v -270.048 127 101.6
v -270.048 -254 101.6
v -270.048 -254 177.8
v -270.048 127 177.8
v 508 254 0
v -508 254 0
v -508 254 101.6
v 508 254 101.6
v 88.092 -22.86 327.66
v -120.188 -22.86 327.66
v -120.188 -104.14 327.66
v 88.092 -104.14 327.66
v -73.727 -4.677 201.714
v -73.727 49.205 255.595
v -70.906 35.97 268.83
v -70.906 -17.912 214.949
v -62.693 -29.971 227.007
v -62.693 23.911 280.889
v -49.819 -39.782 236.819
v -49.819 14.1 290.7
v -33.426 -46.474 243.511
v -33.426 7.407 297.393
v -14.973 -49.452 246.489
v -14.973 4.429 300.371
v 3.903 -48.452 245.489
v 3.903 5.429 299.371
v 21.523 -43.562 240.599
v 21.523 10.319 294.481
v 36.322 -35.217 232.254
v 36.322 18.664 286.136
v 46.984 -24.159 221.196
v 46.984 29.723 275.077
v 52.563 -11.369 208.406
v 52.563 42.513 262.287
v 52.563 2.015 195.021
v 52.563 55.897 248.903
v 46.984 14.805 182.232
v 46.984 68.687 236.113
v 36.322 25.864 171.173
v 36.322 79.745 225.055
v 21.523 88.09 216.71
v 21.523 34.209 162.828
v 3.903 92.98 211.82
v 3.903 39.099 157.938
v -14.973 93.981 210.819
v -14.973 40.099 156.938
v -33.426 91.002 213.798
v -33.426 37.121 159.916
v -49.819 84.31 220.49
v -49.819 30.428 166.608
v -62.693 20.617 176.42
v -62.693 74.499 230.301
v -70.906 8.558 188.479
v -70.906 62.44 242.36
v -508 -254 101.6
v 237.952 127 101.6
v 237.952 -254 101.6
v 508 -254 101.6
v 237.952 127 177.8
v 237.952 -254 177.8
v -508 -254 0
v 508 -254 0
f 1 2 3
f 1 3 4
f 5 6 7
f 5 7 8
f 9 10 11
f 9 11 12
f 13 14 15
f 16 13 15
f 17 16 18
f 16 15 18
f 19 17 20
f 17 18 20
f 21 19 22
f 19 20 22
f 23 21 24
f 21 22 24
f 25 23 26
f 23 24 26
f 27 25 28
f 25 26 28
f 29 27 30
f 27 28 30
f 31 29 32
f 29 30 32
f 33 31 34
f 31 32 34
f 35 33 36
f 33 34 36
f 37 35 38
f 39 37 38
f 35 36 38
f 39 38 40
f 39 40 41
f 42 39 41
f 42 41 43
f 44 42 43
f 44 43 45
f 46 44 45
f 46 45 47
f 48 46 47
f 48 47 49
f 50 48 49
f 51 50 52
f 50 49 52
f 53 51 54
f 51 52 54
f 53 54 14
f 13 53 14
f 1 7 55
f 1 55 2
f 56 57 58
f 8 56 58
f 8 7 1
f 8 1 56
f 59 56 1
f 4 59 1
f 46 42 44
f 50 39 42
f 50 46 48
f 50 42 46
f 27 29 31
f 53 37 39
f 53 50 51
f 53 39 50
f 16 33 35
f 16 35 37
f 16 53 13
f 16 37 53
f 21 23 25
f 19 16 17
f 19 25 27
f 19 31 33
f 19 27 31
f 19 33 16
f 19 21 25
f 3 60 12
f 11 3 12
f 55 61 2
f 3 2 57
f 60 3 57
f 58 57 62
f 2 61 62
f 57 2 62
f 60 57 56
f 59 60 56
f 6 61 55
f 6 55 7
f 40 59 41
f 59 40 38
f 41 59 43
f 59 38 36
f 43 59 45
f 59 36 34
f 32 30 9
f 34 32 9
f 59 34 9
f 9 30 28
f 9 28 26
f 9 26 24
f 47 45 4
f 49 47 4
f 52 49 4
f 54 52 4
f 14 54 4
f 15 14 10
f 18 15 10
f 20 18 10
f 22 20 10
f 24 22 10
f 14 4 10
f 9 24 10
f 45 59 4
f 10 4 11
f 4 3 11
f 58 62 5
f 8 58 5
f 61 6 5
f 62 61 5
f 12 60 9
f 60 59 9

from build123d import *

# Parameters (mm, degrees)
F0_W      = 1016
F0_H      = 508
F1_DEPTH  = 101.6
F4_W      = 237.9516797066
F4_H      = 381
F4_W_2    = 270.0483202934
F5_DEPTH  = 76.2
F5_FACE_W = 508
F5_FACE_H = 381
F6_DEPTH  = 149.86
F6_TAPER  = 45
F7_R      = 63.5
F8_DEPTH  = 76.2


# Not quite as in the source:
# - the program builds the solid bodies; features that only make, move or delete a surface that nothing else refers to are left out


with BuildPart() as f1:
    # F0 (on Top) → F1 (new body)
    with BuildSketch(Plane.XY):
        Rectangle(F0_W, F0_H)
    extrude(amount=F1_DEPTH)

    # F4 (on face) → F5 (join)
    with BuildSketch(Plane.XY.offset(101.6)):
        with Locations((118.9758398533, -63.5)):
            Rectangle(F4_W, F4_H)
        with Locations((-135.0241601467, -63.5)):
            Rectangle(F4_W_2, F4_H)
    extrude(amount=F5_DEPTH)

    # F5_face (on face) → F6 (join, symmetric)
    with BuildSketch(Plane(origin=(-16.0483202934, -63.5, 177.8), x_dir=(1, 0, 0), z_dir=(0, 0, 1))):
        Rectangle(F5_FACE_W, F5_FACE_H)
    extrude(amount=F6_DEPTH, both=True, taper=F6_TAPER)

    # F7 (on face) → F8 (cut)
    with BuildSketch(Plane(origin=(0, 152.4, 152.4), x_dir=(-1, 0, 0), z_dir=(0, 0.7071067812, 0.7071067812))):
        with Locations((10.2272699534, 145.9400733915)):
            Circle(F7_R)
    extrude(amount=-F8_DEPTH, mode=Mode.SUBTRACT)


solid = f1.part
